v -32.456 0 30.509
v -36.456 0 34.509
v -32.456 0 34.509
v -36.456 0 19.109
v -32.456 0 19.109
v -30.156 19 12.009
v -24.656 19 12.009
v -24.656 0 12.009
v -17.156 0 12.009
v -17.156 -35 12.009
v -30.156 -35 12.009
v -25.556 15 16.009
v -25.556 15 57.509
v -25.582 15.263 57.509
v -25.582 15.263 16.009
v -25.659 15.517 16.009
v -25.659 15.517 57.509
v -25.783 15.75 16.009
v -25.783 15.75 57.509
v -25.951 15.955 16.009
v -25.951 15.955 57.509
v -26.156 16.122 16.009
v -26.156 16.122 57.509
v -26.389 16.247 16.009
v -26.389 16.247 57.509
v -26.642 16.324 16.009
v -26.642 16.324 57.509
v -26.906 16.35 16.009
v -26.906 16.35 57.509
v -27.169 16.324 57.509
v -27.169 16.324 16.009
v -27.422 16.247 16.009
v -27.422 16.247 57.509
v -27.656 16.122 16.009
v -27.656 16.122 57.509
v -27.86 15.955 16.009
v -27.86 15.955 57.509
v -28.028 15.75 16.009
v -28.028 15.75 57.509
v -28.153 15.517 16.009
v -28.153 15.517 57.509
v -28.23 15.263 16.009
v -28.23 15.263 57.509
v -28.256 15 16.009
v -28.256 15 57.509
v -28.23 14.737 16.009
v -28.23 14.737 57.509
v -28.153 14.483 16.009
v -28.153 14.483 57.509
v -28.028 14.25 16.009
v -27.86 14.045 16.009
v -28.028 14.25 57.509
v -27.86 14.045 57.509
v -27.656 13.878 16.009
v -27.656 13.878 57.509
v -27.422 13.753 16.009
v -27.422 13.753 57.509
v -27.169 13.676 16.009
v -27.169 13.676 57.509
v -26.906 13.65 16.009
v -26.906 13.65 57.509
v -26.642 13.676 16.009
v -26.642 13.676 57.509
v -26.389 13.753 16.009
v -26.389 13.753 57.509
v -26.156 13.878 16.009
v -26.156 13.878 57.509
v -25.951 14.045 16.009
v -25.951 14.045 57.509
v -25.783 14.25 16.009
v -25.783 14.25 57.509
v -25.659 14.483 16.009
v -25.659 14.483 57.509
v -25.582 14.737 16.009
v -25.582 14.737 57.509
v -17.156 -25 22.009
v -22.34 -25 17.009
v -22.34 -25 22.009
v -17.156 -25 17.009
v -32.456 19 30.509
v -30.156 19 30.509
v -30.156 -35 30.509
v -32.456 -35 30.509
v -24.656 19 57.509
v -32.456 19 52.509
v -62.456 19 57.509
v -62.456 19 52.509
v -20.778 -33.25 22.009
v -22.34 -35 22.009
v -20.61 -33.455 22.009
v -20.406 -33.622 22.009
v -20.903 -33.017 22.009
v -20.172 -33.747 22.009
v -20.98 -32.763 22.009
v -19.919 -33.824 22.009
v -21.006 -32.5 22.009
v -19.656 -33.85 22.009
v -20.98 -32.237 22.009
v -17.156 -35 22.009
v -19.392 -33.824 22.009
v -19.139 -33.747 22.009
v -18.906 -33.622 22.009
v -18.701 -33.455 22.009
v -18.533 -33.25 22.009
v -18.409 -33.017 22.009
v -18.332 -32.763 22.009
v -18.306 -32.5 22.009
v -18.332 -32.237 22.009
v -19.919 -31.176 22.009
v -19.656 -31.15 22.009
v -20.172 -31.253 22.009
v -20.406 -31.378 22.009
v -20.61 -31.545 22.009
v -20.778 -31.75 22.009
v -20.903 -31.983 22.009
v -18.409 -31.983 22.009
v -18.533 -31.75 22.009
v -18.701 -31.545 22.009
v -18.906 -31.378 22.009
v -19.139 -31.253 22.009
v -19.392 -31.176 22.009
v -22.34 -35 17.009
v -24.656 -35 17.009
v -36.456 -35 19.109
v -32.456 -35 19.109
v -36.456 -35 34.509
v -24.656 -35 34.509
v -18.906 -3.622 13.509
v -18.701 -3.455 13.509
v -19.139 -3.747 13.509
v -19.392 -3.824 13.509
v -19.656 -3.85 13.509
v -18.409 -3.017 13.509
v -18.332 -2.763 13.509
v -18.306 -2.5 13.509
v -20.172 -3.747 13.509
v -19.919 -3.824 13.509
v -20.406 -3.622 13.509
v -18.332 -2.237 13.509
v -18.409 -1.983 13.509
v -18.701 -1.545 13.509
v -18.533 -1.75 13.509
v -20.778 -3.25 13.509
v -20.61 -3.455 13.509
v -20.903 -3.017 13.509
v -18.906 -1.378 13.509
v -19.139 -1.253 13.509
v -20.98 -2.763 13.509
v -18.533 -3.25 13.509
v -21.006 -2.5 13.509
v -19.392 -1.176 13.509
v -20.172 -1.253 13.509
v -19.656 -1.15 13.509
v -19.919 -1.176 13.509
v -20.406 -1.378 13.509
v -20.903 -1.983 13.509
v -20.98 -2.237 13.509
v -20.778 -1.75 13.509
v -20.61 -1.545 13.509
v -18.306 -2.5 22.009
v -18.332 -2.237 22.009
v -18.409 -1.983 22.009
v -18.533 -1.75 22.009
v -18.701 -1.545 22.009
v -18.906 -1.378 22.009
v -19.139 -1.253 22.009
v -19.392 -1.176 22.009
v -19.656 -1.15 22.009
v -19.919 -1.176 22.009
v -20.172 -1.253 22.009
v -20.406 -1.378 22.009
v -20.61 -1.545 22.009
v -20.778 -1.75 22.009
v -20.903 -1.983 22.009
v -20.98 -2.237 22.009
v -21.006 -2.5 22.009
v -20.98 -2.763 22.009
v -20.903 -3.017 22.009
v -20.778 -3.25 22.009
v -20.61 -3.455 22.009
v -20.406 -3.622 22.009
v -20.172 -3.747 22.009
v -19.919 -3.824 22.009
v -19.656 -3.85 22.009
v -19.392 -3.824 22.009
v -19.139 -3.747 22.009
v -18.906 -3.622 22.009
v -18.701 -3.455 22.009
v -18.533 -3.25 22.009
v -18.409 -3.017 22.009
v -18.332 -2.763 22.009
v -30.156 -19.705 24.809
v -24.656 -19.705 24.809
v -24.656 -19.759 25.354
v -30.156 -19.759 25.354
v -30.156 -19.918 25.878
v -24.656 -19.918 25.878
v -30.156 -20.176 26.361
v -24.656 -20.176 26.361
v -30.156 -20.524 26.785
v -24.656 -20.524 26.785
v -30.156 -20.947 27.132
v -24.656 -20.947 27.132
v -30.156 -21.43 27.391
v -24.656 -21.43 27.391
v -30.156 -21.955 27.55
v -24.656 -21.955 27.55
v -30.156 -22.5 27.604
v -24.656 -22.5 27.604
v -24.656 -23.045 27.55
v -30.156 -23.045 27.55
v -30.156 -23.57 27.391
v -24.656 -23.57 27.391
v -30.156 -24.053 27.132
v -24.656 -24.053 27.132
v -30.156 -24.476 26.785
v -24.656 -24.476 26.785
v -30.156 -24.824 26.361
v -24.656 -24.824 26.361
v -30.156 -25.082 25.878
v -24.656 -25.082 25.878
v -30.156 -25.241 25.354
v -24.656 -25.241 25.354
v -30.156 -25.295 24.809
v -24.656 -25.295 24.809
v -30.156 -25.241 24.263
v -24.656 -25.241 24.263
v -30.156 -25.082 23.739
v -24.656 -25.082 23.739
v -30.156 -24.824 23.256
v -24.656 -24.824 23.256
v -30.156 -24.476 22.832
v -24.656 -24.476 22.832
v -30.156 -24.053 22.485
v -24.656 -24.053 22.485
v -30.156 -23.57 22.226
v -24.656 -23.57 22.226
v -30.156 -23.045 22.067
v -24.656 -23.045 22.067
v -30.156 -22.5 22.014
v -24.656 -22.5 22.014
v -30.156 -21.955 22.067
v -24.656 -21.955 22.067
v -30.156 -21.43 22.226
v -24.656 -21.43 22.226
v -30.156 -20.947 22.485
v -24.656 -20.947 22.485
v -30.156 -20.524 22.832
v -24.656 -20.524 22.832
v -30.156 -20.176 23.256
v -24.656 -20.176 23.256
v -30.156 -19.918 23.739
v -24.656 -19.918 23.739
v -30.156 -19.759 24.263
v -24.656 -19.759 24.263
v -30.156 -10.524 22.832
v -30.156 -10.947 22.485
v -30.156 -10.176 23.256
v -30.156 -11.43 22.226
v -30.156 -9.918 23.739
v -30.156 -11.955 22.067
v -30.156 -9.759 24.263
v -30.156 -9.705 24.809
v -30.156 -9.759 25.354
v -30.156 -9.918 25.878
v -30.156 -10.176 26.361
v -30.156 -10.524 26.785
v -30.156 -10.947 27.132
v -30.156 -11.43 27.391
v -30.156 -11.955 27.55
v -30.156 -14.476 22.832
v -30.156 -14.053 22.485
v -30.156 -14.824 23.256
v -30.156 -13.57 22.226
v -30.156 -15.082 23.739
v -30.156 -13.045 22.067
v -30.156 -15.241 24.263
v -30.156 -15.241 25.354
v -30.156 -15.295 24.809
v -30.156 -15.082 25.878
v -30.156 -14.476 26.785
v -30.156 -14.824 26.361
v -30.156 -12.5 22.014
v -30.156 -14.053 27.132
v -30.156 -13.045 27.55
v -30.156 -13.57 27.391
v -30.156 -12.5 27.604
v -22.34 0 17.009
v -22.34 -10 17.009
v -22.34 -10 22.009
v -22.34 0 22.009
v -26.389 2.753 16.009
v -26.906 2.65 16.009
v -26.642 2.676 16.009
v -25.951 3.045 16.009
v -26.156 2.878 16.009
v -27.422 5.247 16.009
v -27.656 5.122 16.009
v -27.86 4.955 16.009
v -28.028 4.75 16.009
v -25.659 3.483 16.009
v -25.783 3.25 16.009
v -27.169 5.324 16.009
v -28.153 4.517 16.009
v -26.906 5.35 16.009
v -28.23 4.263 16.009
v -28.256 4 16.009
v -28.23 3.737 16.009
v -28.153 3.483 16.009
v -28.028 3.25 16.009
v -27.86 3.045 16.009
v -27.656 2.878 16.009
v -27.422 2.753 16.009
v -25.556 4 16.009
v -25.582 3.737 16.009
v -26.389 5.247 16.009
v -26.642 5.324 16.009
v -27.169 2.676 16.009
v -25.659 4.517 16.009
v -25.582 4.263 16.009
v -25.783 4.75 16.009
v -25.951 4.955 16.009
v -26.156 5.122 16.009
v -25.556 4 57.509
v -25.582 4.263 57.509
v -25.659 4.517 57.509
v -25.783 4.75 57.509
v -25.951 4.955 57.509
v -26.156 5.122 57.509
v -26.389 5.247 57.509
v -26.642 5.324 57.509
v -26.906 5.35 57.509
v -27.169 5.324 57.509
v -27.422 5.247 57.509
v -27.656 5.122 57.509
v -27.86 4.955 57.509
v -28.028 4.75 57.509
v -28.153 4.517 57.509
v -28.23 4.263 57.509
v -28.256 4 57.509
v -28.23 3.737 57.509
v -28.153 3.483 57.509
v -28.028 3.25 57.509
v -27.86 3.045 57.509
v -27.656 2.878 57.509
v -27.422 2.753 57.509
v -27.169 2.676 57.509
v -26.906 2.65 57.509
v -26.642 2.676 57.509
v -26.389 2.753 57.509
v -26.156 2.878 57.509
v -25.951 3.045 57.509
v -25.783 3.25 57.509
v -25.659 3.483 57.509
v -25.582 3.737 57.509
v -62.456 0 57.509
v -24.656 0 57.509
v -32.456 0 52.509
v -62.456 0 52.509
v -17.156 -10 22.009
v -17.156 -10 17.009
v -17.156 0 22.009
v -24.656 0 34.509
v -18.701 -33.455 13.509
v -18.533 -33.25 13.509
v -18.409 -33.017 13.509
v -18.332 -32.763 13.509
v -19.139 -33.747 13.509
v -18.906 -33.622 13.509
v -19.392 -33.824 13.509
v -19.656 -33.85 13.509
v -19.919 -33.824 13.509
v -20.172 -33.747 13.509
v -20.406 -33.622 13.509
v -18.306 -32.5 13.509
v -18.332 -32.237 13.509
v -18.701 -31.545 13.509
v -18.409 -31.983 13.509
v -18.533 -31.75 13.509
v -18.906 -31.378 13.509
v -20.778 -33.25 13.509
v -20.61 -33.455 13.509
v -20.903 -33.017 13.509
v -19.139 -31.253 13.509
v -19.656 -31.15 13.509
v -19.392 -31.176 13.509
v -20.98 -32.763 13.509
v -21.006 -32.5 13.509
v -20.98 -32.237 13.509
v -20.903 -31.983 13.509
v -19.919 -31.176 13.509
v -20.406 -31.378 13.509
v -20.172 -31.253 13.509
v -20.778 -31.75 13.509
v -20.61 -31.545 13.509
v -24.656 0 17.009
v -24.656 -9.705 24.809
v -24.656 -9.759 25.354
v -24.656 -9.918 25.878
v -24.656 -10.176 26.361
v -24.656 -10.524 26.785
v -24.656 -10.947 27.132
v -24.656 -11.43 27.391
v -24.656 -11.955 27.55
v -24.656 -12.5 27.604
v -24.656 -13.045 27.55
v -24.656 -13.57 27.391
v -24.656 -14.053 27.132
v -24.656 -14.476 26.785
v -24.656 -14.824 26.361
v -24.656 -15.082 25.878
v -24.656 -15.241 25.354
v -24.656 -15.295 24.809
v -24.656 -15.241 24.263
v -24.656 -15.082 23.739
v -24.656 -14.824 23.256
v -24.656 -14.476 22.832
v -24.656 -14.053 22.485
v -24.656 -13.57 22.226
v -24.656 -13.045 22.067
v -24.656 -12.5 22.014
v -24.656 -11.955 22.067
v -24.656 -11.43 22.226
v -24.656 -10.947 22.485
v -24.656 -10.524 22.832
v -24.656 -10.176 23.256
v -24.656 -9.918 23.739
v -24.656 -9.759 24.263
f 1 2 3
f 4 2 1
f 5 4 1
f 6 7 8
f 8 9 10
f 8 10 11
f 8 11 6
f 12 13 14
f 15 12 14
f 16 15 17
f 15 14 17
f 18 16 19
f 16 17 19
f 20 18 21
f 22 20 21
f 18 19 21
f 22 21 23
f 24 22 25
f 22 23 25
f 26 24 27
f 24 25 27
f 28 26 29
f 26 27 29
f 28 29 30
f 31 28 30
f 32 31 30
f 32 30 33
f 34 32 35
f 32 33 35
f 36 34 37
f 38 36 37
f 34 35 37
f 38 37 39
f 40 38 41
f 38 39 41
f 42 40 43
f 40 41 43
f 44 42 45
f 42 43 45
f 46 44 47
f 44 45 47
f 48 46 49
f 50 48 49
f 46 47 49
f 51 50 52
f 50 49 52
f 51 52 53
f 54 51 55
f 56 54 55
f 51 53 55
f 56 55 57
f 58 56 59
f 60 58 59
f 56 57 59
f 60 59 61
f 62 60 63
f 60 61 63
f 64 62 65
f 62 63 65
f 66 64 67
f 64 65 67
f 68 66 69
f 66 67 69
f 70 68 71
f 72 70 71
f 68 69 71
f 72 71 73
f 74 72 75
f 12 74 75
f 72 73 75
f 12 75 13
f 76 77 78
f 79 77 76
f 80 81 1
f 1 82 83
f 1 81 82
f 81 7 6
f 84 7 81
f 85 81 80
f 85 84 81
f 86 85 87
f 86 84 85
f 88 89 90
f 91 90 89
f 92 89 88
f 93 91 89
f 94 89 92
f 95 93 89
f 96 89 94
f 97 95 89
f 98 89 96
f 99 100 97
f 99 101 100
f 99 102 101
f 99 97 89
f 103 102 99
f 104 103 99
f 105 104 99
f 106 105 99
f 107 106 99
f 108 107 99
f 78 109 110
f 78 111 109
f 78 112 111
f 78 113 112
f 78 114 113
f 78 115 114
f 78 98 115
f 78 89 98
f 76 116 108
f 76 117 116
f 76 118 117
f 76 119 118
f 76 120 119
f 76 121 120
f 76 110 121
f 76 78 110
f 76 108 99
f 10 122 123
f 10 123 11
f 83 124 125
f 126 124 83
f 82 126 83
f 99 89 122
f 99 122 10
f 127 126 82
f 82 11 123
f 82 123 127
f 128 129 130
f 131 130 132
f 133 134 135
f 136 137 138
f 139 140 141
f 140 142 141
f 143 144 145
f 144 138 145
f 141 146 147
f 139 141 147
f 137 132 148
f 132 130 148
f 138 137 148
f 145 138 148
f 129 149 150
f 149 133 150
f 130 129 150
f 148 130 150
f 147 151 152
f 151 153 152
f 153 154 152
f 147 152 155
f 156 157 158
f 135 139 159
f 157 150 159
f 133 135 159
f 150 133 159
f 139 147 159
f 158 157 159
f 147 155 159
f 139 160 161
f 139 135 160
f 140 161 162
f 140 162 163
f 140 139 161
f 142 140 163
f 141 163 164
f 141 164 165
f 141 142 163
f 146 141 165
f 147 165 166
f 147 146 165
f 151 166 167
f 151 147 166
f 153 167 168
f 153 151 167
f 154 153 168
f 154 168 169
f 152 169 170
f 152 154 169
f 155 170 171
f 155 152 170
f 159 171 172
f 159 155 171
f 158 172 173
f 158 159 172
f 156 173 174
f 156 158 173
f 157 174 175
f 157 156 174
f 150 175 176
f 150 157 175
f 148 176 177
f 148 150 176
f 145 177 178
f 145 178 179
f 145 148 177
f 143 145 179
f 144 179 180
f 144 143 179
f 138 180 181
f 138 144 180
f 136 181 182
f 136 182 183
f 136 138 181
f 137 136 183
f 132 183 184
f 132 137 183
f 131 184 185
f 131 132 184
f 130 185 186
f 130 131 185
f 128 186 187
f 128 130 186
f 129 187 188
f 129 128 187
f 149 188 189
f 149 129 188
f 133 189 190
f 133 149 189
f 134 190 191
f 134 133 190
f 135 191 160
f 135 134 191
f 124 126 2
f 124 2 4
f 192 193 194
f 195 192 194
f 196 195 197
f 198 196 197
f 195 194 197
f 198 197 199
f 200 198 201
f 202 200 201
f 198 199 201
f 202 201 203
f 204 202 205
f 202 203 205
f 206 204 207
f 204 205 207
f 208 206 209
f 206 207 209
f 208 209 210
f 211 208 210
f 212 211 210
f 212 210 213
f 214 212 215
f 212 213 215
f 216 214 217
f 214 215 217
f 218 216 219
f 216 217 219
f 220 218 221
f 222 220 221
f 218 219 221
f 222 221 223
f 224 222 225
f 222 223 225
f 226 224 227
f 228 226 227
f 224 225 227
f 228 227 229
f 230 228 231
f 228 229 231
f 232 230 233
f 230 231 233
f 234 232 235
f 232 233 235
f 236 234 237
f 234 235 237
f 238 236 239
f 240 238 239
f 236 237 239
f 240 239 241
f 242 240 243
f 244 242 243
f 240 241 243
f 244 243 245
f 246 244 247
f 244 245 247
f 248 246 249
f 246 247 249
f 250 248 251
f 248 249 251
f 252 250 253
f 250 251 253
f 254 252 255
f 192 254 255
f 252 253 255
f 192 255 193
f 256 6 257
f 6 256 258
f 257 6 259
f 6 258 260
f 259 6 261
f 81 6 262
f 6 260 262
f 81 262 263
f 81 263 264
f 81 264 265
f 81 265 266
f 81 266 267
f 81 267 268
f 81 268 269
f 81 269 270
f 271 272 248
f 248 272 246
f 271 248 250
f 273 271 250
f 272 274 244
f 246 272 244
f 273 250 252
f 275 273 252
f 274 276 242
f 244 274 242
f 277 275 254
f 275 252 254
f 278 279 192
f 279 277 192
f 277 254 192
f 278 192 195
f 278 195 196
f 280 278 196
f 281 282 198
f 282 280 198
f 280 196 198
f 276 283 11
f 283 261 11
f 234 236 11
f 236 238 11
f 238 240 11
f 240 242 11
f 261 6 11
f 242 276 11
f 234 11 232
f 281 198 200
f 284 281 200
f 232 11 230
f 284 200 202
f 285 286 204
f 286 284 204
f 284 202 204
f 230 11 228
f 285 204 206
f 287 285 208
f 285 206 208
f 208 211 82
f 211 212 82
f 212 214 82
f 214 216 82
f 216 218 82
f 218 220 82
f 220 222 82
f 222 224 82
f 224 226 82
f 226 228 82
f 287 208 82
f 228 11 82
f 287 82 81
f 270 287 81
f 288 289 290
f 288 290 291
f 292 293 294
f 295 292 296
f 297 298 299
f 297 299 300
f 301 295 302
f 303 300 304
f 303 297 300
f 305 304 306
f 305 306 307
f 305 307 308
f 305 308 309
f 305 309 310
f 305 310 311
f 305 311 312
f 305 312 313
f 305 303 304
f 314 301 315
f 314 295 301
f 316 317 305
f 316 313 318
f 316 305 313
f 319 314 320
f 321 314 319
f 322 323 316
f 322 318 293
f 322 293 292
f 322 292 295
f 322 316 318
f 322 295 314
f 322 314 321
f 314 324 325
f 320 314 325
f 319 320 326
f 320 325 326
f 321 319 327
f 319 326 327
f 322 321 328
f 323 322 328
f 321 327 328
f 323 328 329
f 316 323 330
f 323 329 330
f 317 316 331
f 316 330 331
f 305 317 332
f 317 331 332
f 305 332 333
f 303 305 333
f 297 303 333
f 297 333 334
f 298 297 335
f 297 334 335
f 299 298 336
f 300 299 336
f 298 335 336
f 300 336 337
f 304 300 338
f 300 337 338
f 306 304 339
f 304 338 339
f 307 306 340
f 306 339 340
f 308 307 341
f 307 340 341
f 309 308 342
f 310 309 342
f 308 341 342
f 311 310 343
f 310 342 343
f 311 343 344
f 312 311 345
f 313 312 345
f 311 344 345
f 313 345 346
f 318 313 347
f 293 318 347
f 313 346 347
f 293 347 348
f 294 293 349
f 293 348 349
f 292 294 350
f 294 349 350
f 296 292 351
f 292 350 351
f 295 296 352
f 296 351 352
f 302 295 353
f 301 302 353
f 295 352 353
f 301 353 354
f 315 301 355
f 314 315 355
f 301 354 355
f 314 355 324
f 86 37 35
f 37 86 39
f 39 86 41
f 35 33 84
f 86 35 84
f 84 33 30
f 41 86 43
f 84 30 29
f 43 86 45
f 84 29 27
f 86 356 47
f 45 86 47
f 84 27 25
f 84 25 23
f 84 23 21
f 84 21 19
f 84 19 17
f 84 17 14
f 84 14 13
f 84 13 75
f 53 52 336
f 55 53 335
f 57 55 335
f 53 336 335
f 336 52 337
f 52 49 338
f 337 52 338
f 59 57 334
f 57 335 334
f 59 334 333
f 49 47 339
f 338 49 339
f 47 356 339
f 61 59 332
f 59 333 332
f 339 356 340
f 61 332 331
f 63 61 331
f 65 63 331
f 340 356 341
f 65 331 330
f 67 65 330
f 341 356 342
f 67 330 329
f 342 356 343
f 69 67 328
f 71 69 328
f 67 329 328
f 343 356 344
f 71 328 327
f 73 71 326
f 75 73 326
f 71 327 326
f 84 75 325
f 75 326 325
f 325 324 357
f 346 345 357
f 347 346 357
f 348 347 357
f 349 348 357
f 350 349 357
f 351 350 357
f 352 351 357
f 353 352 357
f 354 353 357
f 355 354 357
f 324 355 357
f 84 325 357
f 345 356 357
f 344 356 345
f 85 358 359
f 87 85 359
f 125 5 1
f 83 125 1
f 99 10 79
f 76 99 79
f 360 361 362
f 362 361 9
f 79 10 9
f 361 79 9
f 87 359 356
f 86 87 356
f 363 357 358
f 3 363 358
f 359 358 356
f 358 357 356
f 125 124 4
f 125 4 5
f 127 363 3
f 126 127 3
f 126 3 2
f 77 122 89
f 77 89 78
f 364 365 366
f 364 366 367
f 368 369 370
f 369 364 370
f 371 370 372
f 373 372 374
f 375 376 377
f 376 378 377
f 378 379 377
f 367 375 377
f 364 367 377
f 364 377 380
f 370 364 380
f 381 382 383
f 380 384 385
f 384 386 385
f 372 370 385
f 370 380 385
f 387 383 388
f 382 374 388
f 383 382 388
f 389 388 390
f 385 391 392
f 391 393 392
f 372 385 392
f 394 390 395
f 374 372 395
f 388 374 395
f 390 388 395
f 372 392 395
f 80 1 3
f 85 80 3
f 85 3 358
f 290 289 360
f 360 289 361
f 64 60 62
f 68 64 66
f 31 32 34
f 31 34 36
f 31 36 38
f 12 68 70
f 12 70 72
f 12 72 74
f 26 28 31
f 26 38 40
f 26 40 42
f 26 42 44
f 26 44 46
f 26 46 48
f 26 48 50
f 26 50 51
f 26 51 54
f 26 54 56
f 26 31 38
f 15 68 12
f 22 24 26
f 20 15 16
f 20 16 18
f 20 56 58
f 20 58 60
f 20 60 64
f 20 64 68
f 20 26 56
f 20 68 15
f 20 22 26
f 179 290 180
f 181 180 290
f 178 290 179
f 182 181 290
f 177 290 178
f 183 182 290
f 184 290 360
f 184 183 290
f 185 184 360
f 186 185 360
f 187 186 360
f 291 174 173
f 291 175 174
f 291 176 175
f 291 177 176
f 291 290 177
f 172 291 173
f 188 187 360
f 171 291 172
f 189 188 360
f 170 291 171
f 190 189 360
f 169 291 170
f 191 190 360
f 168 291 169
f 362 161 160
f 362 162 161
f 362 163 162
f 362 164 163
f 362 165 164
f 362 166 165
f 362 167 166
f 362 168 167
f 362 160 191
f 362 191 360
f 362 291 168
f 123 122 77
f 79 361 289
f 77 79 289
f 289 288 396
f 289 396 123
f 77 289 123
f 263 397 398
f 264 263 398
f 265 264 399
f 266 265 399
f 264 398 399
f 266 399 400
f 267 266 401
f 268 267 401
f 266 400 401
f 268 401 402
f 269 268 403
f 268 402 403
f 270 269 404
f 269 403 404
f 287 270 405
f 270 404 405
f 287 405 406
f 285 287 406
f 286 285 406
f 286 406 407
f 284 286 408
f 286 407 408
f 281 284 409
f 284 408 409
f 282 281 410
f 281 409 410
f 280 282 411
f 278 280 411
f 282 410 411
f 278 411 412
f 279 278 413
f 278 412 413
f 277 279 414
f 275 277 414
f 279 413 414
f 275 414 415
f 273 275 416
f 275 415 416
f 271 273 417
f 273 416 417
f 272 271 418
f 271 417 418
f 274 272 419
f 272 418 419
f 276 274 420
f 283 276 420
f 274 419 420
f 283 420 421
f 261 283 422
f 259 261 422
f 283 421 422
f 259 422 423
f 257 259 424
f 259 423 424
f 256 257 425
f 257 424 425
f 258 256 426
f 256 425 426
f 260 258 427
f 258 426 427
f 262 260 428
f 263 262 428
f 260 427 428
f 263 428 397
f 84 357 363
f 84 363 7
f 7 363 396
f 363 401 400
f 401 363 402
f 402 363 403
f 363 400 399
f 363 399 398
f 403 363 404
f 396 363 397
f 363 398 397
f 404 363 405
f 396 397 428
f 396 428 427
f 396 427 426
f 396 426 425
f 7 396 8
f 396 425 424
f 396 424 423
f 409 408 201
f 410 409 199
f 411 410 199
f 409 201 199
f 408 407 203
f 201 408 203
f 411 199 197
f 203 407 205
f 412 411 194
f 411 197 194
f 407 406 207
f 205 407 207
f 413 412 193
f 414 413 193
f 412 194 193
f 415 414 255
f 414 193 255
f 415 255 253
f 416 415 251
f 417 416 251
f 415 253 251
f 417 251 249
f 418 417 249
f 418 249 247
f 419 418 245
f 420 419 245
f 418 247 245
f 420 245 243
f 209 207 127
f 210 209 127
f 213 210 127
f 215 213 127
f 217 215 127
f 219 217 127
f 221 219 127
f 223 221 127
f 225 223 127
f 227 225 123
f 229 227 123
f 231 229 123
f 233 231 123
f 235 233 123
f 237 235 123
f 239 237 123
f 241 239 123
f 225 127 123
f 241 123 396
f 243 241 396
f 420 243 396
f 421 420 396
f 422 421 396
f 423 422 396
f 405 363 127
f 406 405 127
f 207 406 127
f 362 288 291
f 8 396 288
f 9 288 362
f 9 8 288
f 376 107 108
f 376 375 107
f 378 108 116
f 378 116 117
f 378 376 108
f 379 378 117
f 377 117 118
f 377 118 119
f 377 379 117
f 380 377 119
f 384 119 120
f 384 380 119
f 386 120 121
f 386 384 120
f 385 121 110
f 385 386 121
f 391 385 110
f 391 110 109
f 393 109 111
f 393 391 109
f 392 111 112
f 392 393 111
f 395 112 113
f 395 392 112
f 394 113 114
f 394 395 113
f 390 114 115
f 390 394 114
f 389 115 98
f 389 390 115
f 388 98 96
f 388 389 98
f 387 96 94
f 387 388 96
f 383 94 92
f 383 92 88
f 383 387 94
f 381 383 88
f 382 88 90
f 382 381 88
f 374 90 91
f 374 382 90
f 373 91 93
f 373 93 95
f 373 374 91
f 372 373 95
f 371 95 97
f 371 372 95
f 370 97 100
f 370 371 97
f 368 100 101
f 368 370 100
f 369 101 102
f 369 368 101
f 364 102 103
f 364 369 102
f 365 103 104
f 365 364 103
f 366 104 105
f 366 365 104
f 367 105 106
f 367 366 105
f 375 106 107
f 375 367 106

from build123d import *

# Parameters (mm, degrees)
F1_DEPTH  = 35
F2_W      = 5.184
F2_H      = 10
F2_R      = 1.35
F3_DEPTH  = 5
F4_R      = 2.795
F5_DEPTH  = 5.5
F7_DEPTH  = 19
F8_R      = 1.35
F9_DEPTH  = 41.5
F10_DEPTH = 3.5


with BuildPart() as f1:
    # F0 (on Front) → F1 (new body)
    with BuildSketch(Plane.XZ):
        Polygon((-36.4558147092, 34.5085331884), (-36.4558147092, 19.1085331884), (-32.4558147092, 19.1085331884), (-32.4558147092, 30.5085331884), (-30.1558147092, 30.5085331884), (-30.1558147092, 12.0085331884), (-17.1558147092, 12.0085331884), (-17.1558147092, 17.0085331884), (-24.6558147092, 17.0085331884), (-24.6558147092, 34.5085331884), align=None)
    extrude(amount=F1_DEPTH)

    # F2 (on face) → F3 (join)
    with BuildSketch(Plane.XY.offset(17.0085331884)):
        with Locations((-19.7478147092, -5)):
            Rectangle(F2_W, F2_H)
        with Locations((-19.6558147092, -2.5)):
            Circle(F2_R, mode=Mode.SUBTRACT)
        with Locations((-19.7478147092, -30)):
            Rectangle(F2_W, F2_H)
        with Locations((-19.6558147092, -32.5)):
            Circle(F2_R, mode=Mode.SUBTRACT)
    extrude(amount=F3_DEPTH)

    # F4 (on face) → F5 (cut, through all)
    with BuildSketch(Plane.YZ.offset(-24.6558147092)):
        with Locations((-22.5, 24.8085331884)):
            Circle(F4_R)
        with Locations((-12.5, 24.8085331884)):
            Circle(F4_R)
    extrude(amount=-F5_DEPTH, mode=Mode.SUBTRACT)

    # F6 (on face) → F7 (join)
    with BuildSketch(Plane(origin=(0, 0, 0), x_dir=(-1, 0, 0), z_dir=(0, 1, 0))):
        Polygon((24.6558147092, 12.0085331884), (30.1558147092, 12.0085331884), (30.1558147092, 30.5085331884), (32.4558147092, 30.5085331884), (32.4558147092, 34.5085331884), (32.4558147092, 52.5085331884), (62.4558147092, 52.5085331884), (62.4558147092, 57.5085331884), (24.6558147092, 57.5085331884), align=None)
    extrude(amount=F7_DEPTH)

    # F8 (on face) → F9 (cut)
    with BuildSketch(Plane.XY.offset(57.5085331884)):
        with Locations((-26.9058147092, 4)):
            Circle(F8_R)
        with Locations((-26.9058147092, 15)):
            Circle(F8_R)
    extrude(amount=-F9_DEPTH, mode=Mode.SUBTRACT)

    # F10 (cut): faces of the model
    f10_faces = [f1.faces().sort_by_distance(p)[0] for p in [
        (-19.6558147092, -32.5, 17.0085331884),
        (-19.6558147092, -2.5, 17.0085331884),
    ]]
    extrude(f10_faces, amount=-F10_DEPTH, mode=Mode.SUBTRACT)


solid = f1.part
